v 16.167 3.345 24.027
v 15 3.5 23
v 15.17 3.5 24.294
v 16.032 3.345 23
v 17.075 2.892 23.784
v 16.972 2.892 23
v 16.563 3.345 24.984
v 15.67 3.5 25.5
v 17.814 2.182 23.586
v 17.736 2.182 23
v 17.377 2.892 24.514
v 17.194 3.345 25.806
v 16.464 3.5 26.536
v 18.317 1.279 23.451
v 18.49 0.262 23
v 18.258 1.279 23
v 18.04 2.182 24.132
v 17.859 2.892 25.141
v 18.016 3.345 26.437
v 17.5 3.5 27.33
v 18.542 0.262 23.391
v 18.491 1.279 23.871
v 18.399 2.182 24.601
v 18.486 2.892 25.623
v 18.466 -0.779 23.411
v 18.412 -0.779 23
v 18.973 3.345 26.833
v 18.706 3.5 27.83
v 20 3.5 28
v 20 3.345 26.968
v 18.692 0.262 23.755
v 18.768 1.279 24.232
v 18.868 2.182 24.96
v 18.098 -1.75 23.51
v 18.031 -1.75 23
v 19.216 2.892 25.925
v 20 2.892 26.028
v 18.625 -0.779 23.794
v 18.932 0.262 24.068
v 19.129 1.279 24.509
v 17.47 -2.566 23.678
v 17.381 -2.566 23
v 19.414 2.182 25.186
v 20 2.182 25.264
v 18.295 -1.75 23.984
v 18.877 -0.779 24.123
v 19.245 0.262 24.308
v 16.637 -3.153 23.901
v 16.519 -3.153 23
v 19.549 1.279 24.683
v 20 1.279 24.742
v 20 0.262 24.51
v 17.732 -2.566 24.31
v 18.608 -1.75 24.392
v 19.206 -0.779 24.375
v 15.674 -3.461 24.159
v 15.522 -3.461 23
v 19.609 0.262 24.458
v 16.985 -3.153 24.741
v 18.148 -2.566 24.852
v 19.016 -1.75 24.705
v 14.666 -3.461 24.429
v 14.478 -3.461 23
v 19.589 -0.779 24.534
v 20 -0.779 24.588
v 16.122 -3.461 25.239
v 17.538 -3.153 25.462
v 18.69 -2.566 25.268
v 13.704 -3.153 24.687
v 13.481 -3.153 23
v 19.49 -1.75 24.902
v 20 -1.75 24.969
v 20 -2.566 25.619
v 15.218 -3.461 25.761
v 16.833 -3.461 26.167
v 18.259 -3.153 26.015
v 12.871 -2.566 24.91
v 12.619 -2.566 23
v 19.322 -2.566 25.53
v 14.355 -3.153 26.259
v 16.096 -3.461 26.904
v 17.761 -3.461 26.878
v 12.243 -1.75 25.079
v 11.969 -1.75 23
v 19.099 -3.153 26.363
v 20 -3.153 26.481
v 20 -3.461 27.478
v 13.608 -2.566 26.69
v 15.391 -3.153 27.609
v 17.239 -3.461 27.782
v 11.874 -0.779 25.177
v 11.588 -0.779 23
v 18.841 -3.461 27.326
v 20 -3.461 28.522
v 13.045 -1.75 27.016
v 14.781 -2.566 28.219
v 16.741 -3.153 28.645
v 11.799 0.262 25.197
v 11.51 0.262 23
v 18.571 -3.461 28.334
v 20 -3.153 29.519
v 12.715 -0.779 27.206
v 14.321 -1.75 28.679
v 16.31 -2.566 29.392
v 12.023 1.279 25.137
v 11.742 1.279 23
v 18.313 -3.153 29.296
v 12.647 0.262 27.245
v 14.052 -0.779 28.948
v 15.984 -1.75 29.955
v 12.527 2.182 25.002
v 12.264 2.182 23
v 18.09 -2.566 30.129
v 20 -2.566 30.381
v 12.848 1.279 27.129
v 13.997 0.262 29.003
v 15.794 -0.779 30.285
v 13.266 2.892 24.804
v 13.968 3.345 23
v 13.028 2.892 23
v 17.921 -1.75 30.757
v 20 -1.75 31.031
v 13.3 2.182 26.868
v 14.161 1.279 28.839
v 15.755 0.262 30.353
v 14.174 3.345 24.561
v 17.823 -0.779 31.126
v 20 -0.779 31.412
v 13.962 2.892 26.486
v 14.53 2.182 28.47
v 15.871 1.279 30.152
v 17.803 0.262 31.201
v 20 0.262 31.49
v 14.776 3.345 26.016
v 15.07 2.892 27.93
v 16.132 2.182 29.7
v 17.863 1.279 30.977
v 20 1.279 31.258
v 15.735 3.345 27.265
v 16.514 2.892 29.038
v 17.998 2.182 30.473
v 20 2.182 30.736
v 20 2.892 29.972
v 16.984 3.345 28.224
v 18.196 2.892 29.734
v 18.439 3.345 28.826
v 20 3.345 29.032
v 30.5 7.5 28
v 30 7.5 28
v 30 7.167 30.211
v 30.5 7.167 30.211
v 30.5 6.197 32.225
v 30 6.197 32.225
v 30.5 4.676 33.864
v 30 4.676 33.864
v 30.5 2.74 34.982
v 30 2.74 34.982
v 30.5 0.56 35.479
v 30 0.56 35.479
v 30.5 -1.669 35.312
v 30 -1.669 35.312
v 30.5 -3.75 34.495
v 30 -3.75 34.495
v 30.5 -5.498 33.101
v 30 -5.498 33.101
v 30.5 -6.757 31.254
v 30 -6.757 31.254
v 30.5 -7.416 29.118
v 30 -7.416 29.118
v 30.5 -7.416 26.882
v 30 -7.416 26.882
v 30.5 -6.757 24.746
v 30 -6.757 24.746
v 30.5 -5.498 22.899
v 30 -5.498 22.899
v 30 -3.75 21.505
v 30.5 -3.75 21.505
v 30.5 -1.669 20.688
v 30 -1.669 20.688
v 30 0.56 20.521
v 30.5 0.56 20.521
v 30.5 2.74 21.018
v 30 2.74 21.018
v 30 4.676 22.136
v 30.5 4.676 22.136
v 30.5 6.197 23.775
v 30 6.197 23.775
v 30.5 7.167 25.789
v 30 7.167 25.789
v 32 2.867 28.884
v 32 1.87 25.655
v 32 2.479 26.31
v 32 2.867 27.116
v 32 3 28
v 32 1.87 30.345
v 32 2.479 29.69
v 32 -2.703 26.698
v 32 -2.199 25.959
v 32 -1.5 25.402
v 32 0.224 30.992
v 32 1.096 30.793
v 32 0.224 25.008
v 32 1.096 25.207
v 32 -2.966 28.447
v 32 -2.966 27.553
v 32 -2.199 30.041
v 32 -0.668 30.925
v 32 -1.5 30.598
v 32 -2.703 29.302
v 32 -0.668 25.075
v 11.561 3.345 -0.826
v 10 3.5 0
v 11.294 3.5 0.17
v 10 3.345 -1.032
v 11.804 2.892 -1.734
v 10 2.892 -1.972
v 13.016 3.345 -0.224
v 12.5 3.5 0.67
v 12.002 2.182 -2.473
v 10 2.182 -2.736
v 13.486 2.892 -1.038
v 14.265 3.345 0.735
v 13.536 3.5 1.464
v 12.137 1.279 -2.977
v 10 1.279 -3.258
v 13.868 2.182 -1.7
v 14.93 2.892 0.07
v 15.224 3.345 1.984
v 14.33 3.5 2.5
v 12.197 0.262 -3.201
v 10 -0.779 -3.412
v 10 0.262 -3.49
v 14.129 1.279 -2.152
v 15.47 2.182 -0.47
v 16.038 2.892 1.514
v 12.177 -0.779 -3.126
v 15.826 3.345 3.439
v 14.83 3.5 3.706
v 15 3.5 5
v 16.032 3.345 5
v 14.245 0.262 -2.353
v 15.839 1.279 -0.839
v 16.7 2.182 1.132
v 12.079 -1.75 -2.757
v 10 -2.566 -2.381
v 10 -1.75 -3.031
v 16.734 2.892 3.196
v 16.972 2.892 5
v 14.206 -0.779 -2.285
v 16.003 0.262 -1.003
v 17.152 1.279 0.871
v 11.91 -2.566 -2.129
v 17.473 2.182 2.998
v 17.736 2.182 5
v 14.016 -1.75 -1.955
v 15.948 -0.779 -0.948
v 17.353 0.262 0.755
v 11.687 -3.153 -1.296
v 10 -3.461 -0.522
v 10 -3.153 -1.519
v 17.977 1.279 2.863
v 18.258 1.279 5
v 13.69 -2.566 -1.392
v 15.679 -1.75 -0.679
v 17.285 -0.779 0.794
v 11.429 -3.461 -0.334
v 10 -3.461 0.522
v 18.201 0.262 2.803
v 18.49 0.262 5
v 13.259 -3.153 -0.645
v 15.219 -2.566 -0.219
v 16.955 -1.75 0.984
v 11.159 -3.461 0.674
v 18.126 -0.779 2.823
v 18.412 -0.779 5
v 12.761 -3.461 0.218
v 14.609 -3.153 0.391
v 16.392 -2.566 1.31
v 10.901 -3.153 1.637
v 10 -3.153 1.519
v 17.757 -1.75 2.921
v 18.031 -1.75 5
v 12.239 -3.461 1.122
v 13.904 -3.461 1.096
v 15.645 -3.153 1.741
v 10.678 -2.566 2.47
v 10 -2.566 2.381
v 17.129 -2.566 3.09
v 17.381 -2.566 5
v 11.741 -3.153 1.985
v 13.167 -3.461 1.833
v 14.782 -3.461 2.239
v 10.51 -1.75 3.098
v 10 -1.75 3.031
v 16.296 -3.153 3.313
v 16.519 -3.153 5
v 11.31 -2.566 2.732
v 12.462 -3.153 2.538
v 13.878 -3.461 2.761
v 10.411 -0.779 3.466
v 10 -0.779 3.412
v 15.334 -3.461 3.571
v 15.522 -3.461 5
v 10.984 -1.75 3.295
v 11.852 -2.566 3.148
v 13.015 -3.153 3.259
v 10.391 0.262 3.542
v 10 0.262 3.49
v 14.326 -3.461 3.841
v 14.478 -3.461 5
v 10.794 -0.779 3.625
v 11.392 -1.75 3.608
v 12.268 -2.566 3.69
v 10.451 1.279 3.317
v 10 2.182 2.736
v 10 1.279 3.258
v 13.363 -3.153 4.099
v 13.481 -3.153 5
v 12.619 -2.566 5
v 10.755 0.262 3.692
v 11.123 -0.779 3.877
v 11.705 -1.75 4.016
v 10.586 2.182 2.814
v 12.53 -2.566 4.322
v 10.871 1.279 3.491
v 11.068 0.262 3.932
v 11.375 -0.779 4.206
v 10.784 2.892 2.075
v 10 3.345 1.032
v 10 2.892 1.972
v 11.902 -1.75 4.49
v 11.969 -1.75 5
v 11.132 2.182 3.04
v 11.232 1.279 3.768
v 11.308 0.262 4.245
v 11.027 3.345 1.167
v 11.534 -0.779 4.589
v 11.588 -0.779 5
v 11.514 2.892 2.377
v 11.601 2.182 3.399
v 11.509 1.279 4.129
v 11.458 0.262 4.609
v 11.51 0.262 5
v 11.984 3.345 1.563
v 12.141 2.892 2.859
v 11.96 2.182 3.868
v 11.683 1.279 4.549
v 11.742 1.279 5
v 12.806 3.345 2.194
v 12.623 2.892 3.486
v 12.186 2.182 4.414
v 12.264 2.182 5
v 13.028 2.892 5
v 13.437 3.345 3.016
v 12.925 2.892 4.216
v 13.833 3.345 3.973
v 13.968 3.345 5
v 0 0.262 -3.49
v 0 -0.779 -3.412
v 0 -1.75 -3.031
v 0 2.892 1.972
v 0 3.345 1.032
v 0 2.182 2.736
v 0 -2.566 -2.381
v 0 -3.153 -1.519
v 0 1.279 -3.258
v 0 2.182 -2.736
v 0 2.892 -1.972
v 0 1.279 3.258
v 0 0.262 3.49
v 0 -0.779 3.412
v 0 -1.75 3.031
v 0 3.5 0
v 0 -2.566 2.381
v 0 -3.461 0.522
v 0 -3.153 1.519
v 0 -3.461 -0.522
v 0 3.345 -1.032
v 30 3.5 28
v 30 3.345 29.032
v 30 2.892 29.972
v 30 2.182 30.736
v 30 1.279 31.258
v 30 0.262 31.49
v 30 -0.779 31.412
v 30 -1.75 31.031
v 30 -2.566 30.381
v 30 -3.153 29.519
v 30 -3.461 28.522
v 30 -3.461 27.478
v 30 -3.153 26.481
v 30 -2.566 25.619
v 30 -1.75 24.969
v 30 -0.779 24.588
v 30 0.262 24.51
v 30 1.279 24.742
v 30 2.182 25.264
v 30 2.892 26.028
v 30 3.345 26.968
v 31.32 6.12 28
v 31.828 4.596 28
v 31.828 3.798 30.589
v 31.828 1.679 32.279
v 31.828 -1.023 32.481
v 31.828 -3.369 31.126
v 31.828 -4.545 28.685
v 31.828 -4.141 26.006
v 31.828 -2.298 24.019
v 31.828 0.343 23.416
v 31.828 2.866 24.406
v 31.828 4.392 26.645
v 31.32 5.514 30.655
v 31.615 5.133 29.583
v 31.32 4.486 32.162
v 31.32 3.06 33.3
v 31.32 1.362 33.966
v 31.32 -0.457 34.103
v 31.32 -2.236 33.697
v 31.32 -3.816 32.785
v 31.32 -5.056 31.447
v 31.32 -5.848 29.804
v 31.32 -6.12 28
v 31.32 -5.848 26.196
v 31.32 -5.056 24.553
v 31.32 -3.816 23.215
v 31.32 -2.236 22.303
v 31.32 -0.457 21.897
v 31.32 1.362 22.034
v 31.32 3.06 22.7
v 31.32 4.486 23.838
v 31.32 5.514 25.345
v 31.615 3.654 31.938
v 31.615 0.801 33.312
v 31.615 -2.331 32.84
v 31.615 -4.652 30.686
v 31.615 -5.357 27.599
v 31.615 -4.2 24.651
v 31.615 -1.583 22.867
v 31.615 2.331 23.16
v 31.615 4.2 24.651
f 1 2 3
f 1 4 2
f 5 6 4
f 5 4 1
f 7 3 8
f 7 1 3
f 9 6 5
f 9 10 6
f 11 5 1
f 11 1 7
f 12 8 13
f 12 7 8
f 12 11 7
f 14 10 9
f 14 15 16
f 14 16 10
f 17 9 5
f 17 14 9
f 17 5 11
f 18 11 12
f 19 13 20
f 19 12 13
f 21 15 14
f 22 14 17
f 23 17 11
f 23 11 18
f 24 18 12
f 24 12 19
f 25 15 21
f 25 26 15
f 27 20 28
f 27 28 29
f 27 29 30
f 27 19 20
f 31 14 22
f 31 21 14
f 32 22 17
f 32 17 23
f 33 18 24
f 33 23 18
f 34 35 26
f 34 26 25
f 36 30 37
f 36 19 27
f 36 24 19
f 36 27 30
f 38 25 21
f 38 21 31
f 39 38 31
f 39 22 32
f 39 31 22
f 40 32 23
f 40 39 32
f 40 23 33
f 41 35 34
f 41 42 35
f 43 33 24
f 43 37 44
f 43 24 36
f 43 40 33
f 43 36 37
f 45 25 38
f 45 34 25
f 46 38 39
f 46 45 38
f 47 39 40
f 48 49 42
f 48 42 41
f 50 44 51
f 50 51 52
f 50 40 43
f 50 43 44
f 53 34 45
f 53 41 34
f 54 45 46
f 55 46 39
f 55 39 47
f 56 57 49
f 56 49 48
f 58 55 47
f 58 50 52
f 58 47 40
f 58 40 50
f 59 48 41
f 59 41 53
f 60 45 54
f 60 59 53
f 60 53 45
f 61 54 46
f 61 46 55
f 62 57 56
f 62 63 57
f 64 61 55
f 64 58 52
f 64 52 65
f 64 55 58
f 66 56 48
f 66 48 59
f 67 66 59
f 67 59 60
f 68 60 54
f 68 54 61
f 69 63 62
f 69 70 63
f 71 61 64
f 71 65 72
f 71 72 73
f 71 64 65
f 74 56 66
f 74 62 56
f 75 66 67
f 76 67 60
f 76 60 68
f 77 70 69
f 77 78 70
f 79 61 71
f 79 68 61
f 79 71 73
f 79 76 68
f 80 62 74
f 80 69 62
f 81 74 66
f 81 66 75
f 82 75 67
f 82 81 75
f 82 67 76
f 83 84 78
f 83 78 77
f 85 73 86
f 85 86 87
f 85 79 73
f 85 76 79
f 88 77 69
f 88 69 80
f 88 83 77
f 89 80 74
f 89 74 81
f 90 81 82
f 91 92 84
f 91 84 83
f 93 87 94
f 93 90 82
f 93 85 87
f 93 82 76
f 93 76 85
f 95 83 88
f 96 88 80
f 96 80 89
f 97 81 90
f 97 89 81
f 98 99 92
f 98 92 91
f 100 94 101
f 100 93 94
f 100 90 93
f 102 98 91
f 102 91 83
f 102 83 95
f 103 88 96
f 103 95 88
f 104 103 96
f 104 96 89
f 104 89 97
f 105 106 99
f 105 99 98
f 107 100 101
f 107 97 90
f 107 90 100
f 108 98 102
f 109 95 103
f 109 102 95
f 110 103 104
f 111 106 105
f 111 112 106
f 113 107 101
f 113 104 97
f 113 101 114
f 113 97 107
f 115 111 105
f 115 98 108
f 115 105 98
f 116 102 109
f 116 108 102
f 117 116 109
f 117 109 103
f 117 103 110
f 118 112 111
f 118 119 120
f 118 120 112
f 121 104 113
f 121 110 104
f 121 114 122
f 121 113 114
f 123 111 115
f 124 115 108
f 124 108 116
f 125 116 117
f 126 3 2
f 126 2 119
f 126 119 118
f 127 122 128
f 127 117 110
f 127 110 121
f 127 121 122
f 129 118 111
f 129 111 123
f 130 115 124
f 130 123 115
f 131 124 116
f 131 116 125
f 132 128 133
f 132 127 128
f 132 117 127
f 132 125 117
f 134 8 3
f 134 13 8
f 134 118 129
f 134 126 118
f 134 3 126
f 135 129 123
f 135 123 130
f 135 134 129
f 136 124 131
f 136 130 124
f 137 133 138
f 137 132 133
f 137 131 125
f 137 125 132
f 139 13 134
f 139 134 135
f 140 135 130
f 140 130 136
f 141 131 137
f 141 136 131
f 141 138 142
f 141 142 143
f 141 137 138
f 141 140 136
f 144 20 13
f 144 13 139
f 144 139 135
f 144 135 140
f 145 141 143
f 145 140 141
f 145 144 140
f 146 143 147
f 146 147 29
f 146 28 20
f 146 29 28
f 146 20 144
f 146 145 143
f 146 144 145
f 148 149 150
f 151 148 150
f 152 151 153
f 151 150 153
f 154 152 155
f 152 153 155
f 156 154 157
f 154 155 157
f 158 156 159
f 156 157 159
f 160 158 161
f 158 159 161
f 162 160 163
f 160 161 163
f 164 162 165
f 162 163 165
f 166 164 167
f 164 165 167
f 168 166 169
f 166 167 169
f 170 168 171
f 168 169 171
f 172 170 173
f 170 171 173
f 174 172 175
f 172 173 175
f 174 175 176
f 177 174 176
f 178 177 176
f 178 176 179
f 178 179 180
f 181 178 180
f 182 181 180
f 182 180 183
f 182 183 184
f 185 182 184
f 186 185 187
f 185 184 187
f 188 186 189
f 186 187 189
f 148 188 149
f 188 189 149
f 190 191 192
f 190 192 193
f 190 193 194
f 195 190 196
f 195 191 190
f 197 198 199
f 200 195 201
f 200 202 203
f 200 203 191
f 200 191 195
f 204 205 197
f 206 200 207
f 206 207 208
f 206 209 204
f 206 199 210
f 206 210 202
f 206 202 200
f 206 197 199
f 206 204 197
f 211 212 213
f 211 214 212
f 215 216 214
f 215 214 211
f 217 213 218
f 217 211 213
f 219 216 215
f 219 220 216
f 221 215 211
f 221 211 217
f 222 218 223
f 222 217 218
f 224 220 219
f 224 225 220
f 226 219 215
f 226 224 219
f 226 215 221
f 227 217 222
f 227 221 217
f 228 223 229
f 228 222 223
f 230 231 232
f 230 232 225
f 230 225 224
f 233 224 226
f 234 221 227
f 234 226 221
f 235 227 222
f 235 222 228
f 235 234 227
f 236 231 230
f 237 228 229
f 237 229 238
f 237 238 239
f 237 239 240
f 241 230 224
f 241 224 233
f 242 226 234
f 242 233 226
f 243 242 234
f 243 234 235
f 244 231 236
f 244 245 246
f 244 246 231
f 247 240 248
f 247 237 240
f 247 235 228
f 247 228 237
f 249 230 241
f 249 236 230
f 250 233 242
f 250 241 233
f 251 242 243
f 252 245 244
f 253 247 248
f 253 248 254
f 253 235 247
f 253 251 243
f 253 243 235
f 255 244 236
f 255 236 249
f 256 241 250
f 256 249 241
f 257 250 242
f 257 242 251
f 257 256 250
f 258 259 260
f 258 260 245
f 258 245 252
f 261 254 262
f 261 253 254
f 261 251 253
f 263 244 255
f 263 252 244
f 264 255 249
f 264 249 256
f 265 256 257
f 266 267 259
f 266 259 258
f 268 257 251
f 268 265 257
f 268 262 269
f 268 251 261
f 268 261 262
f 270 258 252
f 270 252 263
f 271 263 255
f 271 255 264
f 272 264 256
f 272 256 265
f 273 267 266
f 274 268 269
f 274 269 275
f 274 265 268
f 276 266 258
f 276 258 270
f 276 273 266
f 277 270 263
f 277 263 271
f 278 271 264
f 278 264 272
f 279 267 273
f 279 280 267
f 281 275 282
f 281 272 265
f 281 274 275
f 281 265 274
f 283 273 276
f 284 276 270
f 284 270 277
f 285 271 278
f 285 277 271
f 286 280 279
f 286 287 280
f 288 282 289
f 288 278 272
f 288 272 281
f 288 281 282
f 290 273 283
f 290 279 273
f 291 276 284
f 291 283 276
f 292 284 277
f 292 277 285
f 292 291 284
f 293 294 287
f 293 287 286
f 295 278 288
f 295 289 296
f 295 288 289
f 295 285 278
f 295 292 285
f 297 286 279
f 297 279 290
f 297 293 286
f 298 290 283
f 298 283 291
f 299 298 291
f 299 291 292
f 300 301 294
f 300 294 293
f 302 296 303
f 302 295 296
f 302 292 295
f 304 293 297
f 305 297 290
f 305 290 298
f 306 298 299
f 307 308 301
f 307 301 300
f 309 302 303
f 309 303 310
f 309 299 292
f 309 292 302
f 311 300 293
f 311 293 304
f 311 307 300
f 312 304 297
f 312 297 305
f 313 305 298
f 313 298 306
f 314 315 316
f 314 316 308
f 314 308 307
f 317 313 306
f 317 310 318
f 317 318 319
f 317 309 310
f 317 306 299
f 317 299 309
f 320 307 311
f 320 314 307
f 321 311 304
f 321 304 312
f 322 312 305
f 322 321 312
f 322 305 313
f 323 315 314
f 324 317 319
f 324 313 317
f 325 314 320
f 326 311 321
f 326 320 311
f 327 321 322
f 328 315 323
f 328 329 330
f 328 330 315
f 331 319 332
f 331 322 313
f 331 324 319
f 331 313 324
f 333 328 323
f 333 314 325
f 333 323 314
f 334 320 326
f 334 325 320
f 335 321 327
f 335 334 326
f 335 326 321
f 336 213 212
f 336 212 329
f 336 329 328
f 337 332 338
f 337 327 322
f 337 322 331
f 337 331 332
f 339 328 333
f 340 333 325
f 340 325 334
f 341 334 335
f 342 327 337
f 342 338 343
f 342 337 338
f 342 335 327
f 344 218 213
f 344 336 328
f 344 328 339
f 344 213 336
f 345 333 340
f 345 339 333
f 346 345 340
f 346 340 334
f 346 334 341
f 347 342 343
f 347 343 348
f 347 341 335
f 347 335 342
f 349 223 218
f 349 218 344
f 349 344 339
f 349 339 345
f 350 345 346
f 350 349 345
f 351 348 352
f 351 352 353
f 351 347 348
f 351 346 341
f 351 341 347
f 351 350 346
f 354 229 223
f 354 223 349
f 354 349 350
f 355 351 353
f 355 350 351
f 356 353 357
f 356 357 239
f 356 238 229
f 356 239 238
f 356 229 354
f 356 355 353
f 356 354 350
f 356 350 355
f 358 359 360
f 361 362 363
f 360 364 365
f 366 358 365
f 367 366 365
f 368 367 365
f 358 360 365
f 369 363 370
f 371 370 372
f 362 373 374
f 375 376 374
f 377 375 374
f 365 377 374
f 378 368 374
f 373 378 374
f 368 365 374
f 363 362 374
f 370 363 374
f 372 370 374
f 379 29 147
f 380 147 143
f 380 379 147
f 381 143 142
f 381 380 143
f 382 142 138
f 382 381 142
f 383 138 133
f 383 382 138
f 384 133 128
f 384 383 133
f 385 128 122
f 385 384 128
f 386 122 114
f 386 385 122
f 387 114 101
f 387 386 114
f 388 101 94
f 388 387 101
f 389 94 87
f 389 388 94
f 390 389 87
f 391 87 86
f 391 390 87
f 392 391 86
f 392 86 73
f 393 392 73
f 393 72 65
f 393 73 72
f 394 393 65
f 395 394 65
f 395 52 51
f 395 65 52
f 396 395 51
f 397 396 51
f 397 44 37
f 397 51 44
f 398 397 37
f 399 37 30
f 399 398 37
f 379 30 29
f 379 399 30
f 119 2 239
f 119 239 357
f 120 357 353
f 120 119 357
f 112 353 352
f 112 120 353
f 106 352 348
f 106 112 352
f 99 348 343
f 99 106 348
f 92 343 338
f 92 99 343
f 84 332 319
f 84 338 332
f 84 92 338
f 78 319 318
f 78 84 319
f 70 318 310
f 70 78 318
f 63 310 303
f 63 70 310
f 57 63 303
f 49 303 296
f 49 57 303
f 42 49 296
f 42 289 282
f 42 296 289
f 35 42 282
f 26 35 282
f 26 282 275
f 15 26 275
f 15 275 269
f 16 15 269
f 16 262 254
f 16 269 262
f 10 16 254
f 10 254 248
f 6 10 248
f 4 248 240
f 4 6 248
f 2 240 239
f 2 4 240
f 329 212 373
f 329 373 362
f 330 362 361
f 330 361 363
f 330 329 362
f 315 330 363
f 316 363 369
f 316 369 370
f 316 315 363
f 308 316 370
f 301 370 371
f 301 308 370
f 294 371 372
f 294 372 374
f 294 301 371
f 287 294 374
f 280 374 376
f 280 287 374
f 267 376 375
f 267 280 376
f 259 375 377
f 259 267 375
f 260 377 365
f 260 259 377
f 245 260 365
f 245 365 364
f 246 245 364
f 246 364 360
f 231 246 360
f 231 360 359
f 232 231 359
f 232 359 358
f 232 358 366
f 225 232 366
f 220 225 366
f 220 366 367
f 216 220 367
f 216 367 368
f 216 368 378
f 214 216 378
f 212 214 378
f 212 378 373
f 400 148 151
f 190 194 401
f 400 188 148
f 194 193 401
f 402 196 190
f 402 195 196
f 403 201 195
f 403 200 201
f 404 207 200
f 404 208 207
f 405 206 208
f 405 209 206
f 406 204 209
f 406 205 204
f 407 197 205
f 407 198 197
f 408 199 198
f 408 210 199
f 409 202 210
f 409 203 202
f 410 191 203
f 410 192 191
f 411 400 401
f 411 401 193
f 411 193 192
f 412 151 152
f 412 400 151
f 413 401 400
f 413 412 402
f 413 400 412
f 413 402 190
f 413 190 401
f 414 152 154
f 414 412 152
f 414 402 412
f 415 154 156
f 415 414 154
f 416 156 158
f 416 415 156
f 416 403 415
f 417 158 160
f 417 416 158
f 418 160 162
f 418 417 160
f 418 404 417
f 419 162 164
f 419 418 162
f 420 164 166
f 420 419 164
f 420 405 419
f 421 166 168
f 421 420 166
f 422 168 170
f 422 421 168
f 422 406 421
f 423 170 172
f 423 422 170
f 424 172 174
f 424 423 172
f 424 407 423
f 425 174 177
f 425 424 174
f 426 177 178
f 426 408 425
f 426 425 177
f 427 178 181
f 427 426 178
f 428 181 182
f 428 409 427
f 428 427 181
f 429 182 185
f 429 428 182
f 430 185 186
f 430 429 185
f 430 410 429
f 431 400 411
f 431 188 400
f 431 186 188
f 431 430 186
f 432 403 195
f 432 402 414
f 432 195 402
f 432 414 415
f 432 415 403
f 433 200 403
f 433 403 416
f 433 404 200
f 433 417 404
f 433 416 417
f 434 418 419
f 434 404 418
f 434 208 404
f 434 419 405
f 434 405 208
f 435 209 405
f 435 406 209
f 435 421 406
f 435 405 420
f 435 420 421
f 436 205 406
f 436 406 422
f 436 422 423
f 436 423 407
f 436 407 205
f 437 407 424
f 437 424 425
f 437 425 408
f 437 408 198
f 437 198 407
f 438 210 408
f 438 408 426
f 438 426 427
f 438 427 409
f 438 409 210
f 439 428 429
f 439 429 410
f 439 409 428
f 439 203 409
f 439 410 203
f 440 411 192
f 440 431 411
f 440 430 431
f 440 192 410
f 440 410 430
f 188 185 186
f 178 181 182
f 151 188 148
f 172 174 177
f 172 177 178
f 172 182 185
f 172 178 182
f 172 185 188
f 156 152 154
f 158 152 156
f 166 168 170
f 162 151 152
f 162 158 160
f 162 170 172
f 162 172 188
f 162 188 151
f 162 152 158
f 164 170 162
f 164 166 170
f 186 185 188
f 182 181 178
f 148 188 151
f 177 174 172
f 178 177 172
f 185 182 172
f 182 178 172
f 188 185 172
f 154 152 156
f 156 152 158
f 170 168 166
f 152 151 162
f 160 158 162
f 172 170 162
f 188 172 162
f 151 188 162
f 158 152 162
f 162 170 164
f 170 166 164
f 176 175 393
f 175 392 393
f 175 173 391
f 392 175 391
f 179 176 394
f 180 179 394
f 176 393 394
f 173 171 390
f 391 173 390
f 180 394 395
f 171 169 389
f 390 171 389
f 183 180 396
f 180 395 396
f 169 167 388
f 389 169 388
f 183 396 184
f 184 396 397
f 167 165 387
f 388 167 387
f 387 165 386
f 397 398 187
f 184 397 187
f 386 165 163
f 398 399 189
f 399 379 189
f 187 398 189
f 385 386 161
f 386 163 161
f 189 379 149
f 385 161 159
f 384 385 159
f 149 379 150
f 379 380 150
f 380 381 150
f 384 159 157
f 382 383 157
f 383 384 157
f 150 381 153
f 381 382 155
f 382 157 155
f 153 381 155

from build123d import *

# Parameters (mm, degrees)
F1_R     = 3.5
F3_R     = 7.5
F3_R_2   = 3.5
F4_DEPTH = 0.5
F5_DEPTH = 0.5
F6_DEPTH = 1.5


# Not quite as in the source:
# - a fillet or chamfer that OpenCascade refuses, or shapes differently, is made with other operations: its cross-section is extruded or revolved along the edge and cut away or added
# - a feature names something its author has since deleted; it is built from what else it names


with BuildPart() as f2:
    # F2: sweep along a path in F0
    with BuildLine(Plane.XZ) as f2_path:
        Line((0, 0), (10, 0))
        ThreePointArc((10, 0), (13.5355339059, 1.4644660941), (15, 5))
        Line((15, 5), (15, 23))
        ThreePointArc((15, 23), (16.4644660941, 26.5355339059), (20, 28))
        Line((20, 28), (30, 28))
    # F1 (on Right) → F2 (sweep)
    with BuildSketch(Plane.YZ):
        Circle(F1_R)
    sweep(path=f2_path.line)

    # F3 (on face) → F4 (join)
    with BuildSketch(Plane.YZ.offset(30)):
        with Locations((0, 28)):
            Circle(F3_R)
        with Locations((0, 28)):
            Circle(F3_R_2, mode=Mode.SUBTRACT)
    extrude(amount=F4_DEPTH)

    # F5 (add): a face of the model
    f5_faces = [f2.faces().sort_by_distance(p)[0] for p in [
        (30, 0, 28),
    ]]
    extrude(f5_faces, amount=F5_DEPTH)


with BuildPart() as f6:
    # F6 (new): a face of the model
    f6_faces = [f2.part.faces().sort_by_distance(p)[0] for p in [
        (30.5, 0, 28),
    ]]
    extrude(f6_faces, amount=F6_DEPTH)

    # F7: fillet of radius 7.5 on 1 edges, made by hand

    # F7_s1 → F7_t2 (revolve, cut)
    with BuildSketch(Plane.XY.offset(28)):
        with BuildLine():
            ThreePointArc((30.5, 7.5), (31.6151247354, 5.3717082451), (32, 3))
            Line((32, 3), (32, 7.5))
            Line((32, 7.5), (30.5, 7.5))
        make_face()
    revolve(axis=Axis((32, 0, 28), (1, 0, 0)), mode=Mode.SUBTRACT)


solid = Compound([f2.part, f6.part])
